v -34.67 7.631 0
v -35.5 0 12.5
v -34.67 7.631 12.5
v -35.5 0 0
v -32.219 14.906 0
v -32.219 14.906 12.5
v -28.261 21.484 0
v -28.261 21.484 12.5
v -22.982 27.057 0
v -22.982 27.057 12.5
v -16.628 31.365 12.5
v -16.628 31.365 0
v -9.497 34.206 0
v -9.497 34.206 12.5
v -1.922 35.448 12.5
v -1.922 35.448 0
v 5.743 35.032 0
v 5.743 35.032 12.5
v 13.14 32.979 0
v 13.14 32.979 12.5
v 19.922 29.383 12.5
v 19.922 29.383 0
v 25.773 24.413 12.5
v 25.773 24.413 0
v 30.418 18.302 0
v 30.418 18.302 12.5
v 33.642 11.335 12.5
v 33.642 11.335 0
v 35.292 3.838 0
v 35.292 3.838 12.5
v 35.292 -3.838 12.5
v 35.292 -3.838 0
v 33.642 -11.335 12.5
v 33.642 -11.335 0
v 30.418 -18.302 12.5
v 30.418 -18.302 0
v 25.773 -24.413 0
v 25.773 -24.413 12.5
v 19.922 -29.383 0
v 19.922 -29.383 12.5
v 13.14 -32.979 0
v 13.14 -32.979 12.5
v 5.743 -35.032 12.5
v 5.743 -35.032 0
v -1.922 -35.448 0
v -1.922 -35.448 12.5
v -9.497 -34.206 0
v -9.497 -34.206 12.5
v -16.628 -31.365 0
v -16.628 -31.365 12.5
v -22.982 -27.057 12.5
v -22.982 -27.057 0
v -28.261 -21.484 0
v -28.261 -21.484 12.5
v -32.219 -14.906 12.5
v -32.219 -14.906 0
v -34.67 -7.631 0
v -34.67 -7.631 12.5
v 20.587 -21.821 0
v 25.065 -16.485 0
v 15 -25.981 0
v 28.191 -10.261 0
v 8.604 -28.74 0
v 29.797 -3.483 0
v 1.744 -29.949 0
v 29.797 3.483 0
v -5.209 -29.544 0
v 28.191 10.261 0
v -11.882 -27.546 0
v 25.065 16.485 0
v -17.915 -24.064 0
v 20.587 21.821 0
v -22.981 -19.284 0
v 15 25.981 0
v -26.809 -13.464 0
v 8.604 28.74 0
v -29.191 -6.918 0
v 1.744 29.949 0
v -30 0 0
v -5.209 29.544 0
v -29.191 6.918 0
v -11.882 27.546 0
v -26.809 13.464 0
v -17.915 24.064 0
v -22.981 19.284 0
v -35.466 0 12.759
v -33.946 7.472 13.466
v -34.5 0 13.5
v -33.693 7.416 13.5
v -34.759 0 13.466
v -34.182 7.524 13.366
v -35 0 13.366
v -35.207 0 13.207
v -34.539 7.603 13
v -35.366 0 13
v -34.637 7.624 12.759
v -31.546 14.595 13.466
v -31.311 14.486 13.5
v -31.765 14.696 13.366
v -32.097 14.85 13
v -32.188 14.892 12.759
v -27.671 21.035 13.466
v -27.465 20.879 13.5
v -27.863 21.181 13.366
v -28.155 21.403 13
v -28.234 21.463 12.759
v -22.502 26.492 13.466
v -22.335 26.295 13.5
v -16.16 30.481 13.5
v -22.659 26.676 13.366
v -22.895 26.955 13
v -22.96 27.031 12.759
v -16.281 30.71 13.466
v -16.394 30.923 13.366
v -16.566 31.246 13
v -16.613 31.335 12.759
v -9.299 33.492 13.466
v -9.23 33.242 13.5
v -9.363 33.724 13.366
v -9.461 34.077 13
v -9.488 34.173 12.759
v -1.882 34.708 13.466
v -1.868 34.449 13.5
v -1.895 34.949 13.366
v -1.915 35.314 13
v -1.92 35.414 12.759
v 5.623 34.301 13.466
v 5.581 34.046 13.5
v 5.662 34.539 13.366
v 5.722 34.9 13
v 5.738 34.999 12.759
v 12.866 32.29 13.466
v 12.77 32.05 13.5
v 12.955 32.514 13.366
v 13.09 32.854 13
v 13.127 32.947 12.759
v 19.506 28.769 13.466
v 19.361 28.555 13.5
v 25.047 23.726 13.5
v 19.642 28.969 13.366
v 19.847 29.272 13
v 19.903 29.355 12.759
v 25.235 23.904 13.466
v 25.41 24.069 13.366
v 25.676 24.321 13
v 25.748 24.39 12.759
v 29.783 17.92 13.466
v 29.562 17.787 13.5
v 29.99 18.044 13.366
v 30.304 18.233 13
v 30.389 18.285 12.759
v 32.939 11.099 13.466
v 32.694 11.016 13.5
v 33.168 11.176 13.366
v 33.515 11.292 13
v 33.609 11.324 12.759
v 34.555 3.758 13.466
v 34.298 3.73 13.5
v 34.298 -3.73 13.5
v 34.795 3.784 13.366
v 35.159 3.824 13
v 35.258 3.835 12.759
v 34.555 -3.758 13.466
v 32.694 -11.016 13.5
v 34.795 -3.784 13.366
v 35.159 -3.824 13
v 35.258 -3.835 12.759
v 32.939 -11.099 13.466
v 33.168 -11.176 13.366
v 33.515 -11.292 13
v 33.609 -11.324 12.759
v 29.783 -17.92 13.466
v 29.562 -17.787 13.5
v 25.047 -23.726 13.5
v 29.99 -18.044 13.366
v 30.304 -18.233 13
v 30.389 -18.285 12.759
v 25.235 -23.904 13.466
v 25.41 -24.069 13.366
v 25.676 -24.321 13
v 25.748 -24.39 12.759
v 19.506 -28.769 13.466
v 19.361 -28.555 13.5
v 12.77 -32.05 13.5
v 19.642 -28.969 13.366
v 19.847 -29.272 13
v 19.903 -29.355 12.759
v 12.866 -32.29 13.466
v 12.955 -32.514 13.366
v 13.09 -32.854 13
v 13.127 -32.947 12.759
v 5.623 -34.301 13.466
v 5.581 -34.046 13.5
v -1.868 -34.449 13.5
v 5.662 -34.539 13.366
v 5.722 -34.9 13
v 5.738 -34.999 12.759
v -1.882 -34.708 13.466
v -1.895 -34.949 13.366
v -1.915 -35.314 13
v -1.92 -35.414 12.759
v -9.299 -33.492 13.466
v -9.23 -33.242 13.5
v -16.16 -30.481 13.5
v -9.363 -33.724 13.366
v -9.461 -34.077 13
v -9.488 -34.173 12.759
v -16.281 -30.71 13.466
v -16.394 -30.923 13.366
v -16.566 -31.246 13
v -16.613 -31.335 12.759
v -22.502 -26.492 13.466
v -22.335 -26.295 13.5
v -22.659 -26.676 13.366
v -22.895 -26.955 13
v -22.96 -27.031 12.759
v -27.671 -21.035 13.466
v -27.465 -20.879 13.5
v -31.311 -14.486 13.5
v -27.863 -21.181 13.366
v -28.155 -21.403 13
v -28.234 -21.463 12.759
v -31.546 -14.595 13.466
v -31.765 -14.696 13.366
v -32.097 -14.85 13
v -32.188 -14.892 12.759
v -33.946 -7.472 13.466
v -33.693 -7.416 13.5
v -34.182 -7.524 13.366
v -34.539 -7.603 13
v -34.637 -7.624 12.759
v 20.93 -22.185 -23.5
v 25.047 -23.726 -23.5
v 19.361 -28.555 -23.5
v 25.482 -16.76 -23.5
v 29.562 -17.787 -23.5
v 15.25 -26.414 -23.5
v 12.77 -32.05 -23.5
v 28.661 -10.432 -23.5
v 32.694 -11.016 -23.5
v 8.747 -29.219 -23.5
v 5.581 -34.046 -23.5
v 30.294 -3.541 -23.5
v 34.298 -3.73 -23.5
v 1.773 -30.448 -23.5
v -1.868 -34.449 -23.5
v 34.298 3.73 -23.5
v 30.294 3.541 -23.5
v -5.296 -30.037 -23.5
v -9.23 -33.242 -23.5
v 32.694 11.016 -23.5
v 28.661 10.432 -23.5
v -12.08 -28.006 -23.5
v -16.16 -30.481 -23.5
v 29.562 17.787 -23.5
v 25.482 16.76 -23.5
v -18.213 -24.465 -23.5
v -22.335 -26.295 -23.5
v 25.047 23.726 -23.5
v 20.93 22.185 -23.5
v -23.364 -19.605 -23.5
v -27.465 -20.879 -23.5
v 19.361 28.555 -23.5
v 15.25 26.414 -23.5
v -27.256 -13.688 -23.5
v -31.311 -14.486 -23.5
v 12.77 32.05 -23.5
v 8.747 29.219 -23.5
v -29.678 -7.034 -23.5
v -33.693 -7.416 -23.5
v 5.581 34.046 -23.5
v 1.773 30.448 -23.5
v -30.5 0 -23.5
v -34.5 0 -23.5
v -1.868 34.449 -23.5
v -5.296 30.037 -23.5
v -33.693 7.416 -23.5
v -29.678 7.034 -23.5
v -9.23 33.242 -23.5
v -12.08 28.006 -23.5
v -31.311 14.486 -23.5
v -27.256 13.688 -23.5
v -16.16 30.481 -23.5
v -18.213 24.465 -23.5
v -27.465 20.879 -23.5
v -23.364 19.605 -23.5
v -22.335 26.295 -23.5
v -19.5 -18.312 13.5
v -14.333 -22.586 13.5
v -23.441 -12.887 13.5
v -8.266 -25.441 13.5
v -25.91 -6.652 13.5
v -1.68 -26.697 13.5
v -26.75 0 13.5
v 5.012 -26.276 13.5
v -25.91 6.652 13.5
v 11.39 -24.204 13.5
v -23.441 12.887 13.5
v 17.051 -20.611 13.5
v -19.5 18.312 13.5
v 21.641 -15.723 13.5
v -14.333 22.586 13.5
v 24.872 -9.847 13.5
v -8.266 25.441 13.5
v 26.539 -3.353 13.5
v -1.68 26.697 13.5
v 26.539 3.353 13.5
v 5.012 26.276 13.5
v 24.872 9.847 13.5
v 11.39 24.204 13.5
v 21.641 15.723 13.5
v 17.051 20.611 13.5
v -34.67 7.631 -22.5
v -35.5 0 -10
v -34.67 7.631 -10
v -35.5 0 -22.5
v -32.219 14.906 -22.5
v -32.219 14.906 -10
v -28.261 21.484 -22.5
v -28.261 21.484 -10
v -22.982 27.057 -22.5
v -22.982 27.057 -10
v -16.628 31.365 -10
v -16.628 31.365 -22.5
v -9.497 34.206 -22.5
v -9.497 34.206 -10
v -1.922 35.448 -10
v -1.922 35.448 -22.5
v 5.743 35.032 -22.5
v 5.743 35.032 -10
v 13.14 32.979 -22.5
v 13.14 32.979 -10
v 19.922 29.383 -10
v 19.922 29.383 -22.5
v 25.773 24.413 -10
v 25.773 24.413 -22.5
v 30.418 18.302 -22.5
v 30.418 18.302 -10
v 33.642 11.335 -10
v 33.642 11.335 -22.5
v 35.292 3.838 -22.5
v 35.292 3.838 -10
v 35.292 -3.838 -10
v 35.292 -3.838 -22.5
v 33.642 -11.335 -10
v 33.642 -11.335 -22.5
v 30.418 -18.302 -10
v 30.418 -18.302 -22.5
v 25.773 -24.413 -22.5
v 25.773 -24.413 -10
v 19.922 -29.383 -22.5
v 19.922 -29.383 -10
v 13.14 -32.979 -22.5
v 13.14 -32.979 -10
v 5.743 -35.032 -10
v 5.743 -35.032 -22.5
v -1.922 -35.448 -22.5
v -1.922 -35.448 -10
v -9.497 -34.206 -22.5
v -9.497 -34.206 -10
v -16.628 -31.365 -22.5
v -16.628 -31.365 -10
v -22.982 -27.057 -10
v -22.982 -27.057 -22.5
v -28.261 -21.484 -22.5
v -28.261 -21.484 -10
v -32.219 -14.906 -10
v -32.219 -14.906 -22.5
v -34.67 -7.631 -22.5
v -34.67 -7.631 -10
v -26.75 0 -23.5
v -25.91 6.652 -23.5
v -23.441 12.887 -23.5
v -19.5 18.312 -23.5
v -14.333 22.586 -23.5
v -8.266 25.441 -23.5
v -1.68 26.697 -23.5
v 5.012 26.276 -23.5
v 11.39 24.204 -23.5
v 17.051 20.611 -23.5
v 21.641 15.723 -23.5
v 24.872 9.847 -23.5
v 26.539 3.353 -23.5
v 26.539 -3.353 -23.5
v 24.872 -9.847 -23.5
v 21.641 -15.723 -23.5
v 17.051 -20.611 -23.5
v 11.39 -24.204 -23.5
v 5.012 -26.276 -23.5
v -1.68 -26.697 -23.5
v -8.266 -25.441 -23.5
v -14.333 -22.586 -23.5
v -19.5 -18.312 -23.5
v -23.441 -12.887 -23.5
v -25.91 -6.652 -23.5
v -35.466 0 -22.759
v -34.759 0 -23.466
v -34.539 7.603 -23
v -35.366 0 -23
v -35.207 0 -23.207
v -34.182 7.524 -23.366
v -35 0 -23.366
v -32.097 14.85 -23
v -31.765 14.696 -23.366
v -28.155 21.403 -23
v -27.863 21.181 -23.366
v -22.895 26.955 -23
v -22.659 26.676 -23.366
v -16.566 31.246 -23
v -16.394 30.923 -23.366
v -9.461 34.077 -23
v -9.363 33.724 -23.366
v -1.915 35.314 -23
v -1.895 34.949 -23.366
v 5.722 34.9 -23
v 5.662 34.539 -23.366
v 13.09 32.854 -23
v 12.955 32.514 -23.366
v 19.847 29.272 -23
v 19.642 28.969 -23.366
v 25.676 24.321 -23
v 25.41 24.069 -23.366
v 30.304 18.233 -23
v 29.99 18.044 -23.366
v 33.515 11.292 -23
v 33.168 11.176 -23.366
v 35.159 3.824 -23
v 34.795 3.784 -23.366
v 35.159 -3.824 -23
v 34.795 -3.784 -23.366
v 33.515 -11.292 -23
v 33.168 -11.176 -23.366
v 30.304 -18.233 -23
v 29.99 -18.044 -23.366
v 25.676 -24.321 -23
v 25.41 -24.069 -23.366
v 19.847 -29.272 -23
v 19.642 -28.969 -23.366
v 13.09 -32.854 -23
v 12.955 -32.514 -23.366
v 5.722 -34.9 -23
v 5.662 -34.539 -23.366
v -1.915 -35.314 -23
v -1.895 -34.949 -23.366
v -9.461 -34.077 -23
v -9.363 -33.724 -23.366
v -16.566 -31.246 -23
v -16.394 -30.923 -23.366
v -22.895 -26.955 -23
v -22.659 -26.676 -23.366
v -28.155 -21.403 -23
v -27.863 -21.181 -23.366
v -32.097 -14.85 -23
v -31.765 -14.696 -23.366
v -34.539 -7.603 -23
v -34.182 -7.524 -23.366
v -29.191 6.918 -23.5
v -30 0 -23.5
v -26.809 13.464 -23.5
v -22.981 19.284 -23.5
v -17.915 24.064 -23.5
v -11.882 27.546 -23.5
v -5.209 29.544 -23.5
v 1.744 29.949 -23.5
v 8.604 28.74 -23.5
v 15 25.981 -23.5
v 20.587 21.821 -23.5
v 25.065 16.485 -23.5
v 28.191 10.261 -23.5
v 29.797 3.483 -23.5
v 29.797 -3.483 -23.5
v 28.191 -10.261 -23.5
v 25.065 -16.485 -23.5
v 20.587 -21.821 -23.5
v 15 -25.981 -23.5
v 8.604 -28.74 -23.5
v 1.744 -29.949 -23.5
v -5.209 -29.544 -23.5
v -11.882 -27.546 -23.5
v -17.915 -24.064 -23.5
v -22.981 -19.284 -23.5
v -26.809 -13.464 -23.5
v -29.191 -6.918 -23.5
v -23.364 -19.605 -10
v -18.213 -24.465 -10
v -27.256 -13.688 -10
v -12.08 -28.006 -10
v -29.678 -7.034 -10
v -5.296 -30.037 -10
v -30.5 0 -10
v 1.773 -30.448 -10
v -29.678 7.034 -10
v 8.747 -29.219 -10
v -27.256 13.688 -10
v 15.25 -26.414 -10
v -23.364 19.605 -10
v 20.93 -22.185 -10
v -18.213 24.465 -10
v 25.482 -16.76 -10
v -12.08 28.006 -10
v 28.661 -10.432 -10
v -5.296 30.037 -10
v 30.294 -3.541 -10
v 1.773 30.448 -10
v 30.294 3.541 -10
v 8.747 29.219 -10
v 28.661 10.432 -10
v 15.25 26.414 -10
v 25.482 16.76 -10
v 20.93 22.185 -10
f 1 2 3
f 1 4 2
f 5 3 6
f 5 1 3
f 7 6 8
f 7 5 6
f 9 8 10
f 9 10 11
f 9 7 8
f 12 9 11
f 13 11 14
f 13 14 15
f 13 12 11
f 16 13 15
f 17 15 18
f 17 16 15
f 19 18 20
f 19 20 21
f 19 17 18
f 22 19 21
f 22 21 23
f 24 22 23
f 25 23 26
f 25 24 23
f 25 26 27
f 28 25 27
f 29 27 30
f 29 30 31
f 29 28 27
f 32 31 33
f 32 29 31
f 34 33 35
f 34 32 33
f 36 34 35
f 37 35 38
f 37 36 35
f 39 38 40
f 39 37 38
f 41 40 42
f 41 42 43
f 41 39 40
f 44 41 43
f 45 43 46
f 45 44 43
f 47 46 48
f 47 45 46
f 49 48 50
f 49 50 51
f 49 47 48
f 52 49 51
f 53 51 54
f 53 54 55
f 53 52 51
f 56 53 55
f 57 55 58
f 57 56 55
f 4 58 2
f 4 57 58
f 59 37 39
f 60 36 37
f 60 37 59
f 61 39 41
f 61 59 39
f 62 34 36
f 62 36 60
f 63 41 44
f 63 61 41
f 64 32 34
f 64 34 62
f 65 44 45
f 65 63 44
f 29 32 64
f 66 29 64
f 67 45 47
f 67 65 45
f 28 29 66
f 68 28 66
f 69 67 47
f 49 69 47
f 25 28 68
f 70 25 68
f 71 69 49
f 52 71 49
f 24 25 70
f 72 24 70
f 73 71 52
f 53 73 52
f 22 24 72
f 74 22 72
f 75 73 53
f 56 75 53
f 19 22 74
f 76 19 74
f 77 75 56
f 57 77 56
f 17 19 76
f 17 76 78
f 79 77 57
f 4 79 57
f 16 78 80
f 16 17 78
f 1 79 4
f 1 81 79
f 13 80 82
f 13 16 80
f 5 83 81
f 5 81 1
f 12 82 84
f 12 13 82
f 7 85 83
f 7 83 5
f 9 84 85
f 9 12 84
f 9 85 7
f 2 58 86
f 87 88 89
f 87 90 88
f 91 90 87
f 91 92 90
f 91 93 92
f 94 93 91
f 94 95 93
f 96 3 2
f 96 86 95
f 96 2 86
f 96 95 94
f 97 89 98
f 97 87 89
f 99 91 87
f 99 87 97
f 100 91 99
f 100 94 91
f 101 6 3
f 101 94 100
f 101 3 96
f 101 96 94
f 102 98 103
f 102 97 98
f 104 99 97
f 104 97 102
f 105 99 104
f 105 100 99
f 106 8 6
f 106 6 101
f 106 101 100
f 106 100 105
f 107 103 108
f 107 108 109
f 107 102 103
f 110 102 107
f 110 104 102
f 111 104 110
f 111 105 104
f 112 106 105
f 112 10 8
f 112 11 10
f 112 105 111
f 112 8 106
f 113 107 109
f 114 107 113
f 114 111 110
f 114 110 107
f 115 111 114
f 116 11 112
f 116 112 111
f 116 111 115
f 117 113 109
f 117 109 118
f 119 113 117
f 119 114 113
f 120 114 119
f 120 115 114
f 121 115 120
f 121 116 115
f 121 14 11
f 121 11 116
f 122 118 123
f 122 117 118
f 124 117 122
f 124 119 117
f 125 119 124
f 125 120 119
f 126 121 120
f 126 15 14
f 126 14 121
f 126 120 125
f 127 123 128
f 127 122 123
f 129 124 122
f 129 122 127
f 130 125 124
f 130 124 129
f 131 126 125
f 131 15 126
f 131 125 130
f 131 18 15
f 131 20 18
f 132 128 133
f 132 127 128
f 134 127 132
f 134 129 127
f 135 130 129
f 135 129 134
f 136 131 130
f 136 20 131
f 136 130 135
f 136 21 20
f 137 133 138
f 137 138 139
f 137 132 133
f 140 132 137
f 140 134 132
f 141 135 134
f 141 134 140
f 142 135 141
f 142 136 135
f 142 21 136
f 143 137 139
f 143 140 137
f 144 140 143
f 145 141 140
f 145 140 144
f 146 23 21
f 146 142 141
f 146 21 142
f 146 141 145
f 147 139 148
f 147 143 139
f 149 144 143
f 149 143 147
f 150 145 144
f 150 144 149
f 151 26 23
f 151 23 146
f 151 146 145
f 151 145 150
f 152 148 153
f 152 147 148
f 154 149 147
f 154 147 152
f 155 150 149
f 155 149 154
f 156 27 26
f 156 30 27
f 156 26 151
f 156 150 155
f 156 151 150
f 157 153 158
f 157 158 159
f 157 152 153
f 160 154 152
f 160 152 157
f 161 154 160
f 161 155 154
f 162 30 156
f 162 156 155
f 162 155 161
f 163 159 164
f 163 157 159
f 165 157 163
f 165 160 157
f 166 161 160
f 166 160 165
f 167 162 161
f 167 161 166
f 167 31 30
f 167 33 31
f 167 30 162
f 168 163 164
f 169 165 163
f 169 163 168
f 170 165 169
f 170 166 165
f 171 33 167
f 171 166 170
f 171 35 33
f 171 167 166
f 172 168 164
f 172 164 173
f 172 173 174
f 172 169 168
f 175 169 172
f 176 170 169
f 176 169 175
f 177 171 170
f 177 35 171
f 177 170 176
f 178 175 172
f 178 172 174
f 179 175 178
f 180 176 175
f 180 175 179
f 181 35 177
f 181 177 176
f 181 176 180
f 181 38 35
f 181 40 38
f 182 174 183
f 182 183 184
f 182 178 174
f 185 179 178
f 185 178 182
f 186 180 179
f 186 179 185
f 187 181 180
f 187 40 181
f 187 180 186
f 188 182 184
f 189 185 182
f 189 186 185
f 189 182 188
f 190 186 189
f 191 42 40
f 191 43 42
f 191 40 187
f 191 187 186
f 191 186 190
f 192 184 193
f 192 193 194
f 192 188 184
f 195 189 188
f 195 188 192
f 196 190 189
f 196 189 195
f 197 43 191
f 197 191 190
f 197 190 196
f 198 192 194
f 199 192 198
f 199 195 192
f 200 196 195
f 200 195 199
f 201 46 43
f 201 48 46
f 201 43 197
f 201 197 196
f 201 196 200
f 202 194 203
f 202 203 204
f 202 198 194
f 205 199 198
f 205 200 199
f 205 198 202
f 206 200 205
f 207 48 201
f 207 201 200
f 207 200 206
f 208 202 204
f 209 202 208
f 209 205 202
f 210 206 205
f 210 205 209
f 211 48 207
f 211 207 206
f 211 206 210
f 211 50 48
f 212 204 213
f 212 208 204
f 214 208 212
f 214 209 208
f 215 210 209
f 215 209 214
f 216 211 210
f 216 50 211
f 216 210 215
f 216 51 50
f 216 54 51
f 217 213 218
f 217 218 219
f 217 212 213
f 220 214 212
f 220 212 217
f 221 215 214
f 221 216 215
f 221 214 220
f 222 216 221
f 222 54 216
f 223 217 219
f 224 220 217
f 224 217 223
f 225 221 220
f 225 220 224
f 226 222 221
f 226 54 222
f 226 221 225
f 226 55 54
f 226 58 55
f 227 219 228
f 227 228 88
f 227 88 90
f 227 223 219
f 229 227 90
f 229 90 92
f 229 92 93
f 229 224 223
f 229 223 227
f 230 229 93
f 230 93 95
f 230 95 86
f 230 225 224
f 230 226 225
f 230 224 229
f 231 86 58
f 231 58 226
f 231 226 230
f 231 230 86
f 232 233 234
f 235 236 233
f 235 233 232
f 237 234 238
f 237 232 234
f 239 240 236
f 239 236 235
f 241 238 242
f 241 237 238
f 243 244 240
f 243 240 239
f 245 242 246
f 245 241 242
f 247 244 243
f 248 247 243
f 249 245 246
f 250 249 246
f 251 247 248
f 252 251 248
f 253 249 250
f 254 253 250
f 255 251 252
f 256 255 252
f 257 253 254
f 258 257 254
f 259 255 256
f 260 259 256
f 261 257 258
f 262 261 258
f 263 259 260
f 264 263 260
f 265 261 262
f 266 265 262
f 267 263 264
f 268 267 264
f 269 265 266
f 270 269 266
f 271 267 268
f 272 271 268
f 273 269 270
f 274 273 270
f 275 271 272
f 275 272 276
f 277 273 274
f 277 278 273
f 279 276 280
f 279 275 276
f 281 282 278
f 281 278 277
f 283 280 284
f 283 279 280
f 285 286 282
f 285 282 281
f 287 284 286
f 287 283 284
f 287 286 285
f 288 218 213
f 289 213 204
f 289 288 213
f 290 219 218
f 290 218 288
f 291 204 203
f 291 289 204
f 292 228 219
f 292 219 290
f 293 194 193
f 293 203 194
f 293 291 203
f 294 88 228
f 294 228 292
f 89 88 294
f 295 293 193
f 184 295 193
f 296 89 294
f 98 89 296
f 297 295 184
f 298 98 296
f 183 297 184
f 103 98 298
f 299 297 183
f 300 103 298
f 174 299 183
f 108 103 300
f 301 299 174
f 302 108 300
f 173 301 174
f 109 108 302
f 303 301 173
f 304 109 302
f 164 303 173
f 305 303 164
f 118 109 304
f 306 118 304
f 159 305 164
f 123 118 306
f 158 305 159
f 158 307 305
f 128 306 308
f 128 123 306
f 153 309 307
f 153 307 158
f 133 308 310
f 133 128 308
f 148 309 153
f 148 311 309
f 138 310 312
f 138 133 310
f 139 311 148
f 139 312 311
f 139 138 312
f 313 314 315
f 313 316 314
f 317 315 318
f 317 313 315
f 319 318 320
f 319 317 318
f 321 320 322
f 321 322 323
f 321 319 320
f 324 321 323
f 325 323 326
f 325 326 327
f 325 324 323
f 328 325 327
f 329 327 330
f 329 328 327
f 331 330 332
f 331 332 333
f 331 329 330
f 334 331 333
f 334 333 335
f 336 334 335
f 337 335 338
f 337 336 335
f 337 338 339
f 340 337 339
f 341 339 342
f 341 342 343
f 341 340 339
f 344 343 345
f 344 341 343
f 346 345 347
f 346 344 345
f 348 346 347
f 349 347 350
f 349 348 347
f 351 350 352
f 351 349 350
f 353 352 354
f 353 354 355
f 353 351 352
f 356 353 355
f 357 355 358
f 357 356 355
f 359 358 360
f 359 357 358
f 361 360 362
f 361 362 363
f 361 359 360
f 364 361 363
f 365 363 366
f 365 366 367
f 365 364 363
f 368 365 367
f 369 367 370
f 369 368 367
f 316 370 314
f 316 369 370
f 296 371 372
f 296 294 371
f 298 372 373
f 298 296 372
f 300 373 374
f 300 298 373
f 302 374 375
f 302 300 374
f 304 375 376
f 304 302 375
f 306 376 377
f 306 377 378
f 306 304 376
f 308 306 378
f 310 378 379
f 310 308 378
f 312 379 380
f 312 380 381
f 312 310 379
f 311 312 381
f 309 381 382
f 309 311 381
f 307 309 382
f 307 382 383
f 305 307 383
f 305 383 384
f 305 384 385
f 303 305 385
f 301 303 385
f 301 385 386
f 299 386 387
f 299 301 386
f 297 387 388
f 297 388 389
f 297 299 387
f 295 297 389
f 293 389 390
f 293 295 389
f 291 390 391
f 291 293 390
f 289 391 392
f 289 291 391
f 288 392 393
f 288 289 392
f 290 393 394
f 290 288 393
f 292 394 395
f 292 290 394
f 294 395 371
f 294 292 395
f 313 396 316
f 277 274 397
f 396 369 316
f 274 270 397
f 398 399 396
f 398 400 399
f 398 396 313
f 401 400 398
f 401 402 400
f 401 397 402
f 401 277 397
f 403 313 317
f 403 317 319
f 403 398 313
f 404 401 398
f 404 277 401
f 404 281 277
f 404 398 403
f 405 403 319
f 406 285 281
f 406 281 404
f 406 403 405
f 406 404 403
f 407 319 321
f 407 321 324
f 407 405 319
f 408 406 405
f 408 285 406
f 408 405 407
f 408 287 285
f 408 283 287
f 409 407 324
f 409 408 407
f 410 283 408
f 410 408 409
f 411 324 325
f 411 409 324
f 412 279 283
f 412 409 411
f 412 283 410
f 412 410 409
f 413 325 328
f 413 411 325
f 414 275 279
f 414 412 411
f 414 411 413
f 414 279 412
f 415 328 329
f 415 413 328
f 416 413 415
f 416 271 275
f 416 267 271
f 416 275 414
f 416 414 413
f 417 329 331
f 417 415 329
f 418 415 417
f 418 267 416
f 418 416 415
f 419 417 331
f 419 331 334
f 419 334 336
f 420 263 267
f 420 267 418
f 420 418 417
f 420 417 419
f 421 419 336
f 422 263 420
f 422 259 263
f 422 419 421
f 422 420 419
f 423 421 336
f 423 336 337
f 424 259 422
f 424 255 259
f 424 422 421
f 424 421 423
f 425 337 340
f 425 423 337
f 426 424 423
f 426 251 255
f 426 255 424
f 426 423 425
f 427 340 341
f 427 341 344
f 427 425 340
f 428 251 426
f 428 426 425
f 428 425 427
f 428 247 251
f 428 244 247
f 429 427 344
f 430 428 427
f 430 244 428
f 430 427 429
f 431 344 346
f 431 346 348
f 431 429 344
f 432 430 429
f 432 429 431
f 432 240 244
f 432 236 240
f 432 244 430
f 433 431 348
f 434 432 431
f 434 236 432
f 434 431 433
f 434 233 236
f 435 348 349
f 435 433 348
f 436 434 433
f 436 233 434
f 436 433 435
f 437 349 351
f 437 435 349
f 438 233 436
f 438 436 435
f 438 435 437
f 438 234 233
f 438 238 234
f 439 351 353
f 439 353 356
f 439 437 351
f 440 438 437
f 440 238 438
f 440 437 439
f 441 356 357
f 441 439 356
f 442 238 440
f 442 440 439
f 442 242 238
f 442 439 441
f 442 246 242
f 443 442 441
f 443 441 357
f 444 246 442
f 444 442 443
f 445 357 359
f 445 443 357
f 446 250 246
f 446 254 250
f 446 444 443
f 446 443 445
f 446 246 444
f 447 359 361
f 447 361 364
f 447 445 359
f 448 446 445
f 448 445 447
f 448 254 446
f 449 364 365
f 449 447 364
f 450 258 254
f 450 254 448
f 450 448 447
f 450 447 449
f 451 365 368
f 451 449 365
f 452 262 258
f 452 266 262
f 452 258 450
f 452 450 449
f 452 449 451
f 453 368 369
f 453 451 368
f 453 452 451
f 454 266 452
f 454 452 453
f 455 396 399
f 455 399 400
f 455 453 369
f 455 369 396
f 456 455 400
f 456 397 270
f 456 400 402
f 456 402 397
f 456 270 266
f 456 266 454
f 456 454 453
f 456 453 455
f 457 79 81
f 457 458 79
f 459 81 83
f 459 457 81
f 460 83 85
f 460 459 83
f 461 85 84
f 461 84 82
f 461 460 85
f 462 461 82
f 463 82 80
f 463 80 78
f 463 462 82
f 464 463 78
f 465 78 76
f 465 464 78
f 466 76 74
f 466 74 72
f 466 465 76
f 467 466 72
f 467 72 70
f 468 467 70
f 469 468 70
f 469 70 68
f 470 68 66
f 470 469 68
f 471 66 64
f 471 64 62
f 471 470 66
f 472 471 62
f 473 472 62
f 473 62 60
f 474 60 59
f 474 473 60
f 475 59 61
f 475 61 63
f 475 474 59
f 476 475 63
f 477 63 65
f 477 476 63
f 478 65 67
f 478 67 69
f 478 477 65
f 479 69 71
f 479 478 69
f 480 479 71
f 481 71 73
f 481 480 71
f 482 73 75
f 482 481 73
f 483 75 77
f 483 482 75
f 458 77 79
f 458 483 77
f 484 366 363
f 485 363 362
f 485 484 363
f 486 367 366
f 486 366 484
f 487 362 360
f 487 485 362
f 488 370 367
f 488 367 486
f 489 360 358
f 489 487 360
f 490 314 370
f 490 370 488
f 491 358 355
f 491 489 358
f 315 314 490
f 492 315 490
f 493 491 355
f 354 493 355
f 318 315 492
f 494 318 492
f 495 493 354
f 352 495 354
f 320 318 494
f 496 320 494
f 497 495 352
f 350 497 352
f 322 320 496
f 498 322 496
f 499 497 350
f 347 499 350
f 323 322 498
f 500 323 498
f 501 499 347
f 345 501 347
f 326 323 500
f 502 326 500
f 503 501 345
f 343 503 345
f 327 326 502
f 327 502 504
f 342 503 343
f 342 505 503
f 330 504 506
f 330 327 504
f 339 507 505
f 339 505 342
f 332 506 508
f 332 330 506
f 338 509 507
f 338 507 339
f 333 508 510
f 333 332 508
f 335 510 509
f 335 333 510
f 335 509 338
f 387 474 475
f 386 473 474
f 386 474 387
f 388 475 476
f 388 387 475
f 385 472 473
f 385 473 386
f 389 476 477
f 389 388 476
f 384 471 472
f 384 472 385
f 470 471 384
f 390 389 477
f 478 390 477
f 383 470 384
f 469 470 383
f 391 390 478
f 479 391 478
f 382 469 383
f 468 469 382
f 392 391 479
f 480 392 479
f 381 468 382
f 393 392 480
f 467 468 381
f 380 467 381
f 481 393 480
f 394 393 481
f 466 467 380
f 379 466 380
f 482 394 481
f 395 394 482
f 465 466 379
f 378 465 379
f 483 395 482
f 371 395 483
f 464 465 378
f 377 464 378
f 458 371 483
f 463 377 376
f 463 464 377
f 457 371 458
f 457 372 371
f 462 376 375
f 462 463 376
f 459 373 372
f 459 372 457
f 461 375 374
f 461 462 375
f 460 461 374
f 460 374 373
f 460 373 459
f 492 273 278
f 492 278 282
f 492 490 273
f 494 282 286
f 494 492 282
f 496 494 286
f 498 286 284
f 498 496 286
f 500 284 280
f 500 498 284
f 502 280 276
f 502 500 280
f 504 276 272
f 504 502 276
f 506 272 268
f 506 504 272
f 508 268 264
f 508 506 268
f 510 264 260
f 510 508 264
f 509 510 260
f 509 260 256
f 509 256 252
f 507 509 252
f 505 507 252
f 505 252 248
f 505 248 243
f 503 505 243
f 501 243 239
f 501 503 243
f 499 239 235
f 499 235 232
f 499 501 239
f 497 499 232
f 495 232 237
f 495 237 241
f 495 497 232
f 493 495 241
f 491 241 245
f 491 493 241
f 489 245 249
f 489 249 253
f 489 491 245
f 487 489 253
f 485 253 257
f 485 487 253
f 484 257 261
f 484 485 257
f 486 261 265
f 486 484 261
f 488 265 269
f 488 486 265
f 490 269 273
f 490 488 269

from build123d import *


with BuildPart() as f1:
    # F0 (on Front) → F1 (revolve)
    with BuildSketch(Plane.XZ):
        with BuildLine():
            Line((-35.5, 12.5), (-35.5, 0))
            Line((-35.5, 0), (-30, 0))
            Line((-30, 0), (-30, -23.5))
            Line((-30, -23.5), (-26.75, -23.5))
            Line((-26.75, -23.5), (-26.75, 13.5))
            Line((-26.75, 13.5), (-34.5, 13.5))
            ThreePointArc((-34.5, 13.5), (-35.207107, 13.207107), (-35.5, 12.5))
        make_face()
        with BuildLine():
            Line((-30.5, -23.5), (-30.5, -10))
            Line((-30.5, -10), (-35.5, -10))
            Line((-35.5, -10), (-35.5, -22.5))
            ThreePointArc((-35.5, -22.5), (-35.207107, -23.207107), (-34.5, -23.5))
            Line((-34.5, -23.5), (-30.5, -23.5))
        make_face()
    revolve(axis=Axis((0, 0, -0.243519), (0, 0, -1)))


solid = f1.part
